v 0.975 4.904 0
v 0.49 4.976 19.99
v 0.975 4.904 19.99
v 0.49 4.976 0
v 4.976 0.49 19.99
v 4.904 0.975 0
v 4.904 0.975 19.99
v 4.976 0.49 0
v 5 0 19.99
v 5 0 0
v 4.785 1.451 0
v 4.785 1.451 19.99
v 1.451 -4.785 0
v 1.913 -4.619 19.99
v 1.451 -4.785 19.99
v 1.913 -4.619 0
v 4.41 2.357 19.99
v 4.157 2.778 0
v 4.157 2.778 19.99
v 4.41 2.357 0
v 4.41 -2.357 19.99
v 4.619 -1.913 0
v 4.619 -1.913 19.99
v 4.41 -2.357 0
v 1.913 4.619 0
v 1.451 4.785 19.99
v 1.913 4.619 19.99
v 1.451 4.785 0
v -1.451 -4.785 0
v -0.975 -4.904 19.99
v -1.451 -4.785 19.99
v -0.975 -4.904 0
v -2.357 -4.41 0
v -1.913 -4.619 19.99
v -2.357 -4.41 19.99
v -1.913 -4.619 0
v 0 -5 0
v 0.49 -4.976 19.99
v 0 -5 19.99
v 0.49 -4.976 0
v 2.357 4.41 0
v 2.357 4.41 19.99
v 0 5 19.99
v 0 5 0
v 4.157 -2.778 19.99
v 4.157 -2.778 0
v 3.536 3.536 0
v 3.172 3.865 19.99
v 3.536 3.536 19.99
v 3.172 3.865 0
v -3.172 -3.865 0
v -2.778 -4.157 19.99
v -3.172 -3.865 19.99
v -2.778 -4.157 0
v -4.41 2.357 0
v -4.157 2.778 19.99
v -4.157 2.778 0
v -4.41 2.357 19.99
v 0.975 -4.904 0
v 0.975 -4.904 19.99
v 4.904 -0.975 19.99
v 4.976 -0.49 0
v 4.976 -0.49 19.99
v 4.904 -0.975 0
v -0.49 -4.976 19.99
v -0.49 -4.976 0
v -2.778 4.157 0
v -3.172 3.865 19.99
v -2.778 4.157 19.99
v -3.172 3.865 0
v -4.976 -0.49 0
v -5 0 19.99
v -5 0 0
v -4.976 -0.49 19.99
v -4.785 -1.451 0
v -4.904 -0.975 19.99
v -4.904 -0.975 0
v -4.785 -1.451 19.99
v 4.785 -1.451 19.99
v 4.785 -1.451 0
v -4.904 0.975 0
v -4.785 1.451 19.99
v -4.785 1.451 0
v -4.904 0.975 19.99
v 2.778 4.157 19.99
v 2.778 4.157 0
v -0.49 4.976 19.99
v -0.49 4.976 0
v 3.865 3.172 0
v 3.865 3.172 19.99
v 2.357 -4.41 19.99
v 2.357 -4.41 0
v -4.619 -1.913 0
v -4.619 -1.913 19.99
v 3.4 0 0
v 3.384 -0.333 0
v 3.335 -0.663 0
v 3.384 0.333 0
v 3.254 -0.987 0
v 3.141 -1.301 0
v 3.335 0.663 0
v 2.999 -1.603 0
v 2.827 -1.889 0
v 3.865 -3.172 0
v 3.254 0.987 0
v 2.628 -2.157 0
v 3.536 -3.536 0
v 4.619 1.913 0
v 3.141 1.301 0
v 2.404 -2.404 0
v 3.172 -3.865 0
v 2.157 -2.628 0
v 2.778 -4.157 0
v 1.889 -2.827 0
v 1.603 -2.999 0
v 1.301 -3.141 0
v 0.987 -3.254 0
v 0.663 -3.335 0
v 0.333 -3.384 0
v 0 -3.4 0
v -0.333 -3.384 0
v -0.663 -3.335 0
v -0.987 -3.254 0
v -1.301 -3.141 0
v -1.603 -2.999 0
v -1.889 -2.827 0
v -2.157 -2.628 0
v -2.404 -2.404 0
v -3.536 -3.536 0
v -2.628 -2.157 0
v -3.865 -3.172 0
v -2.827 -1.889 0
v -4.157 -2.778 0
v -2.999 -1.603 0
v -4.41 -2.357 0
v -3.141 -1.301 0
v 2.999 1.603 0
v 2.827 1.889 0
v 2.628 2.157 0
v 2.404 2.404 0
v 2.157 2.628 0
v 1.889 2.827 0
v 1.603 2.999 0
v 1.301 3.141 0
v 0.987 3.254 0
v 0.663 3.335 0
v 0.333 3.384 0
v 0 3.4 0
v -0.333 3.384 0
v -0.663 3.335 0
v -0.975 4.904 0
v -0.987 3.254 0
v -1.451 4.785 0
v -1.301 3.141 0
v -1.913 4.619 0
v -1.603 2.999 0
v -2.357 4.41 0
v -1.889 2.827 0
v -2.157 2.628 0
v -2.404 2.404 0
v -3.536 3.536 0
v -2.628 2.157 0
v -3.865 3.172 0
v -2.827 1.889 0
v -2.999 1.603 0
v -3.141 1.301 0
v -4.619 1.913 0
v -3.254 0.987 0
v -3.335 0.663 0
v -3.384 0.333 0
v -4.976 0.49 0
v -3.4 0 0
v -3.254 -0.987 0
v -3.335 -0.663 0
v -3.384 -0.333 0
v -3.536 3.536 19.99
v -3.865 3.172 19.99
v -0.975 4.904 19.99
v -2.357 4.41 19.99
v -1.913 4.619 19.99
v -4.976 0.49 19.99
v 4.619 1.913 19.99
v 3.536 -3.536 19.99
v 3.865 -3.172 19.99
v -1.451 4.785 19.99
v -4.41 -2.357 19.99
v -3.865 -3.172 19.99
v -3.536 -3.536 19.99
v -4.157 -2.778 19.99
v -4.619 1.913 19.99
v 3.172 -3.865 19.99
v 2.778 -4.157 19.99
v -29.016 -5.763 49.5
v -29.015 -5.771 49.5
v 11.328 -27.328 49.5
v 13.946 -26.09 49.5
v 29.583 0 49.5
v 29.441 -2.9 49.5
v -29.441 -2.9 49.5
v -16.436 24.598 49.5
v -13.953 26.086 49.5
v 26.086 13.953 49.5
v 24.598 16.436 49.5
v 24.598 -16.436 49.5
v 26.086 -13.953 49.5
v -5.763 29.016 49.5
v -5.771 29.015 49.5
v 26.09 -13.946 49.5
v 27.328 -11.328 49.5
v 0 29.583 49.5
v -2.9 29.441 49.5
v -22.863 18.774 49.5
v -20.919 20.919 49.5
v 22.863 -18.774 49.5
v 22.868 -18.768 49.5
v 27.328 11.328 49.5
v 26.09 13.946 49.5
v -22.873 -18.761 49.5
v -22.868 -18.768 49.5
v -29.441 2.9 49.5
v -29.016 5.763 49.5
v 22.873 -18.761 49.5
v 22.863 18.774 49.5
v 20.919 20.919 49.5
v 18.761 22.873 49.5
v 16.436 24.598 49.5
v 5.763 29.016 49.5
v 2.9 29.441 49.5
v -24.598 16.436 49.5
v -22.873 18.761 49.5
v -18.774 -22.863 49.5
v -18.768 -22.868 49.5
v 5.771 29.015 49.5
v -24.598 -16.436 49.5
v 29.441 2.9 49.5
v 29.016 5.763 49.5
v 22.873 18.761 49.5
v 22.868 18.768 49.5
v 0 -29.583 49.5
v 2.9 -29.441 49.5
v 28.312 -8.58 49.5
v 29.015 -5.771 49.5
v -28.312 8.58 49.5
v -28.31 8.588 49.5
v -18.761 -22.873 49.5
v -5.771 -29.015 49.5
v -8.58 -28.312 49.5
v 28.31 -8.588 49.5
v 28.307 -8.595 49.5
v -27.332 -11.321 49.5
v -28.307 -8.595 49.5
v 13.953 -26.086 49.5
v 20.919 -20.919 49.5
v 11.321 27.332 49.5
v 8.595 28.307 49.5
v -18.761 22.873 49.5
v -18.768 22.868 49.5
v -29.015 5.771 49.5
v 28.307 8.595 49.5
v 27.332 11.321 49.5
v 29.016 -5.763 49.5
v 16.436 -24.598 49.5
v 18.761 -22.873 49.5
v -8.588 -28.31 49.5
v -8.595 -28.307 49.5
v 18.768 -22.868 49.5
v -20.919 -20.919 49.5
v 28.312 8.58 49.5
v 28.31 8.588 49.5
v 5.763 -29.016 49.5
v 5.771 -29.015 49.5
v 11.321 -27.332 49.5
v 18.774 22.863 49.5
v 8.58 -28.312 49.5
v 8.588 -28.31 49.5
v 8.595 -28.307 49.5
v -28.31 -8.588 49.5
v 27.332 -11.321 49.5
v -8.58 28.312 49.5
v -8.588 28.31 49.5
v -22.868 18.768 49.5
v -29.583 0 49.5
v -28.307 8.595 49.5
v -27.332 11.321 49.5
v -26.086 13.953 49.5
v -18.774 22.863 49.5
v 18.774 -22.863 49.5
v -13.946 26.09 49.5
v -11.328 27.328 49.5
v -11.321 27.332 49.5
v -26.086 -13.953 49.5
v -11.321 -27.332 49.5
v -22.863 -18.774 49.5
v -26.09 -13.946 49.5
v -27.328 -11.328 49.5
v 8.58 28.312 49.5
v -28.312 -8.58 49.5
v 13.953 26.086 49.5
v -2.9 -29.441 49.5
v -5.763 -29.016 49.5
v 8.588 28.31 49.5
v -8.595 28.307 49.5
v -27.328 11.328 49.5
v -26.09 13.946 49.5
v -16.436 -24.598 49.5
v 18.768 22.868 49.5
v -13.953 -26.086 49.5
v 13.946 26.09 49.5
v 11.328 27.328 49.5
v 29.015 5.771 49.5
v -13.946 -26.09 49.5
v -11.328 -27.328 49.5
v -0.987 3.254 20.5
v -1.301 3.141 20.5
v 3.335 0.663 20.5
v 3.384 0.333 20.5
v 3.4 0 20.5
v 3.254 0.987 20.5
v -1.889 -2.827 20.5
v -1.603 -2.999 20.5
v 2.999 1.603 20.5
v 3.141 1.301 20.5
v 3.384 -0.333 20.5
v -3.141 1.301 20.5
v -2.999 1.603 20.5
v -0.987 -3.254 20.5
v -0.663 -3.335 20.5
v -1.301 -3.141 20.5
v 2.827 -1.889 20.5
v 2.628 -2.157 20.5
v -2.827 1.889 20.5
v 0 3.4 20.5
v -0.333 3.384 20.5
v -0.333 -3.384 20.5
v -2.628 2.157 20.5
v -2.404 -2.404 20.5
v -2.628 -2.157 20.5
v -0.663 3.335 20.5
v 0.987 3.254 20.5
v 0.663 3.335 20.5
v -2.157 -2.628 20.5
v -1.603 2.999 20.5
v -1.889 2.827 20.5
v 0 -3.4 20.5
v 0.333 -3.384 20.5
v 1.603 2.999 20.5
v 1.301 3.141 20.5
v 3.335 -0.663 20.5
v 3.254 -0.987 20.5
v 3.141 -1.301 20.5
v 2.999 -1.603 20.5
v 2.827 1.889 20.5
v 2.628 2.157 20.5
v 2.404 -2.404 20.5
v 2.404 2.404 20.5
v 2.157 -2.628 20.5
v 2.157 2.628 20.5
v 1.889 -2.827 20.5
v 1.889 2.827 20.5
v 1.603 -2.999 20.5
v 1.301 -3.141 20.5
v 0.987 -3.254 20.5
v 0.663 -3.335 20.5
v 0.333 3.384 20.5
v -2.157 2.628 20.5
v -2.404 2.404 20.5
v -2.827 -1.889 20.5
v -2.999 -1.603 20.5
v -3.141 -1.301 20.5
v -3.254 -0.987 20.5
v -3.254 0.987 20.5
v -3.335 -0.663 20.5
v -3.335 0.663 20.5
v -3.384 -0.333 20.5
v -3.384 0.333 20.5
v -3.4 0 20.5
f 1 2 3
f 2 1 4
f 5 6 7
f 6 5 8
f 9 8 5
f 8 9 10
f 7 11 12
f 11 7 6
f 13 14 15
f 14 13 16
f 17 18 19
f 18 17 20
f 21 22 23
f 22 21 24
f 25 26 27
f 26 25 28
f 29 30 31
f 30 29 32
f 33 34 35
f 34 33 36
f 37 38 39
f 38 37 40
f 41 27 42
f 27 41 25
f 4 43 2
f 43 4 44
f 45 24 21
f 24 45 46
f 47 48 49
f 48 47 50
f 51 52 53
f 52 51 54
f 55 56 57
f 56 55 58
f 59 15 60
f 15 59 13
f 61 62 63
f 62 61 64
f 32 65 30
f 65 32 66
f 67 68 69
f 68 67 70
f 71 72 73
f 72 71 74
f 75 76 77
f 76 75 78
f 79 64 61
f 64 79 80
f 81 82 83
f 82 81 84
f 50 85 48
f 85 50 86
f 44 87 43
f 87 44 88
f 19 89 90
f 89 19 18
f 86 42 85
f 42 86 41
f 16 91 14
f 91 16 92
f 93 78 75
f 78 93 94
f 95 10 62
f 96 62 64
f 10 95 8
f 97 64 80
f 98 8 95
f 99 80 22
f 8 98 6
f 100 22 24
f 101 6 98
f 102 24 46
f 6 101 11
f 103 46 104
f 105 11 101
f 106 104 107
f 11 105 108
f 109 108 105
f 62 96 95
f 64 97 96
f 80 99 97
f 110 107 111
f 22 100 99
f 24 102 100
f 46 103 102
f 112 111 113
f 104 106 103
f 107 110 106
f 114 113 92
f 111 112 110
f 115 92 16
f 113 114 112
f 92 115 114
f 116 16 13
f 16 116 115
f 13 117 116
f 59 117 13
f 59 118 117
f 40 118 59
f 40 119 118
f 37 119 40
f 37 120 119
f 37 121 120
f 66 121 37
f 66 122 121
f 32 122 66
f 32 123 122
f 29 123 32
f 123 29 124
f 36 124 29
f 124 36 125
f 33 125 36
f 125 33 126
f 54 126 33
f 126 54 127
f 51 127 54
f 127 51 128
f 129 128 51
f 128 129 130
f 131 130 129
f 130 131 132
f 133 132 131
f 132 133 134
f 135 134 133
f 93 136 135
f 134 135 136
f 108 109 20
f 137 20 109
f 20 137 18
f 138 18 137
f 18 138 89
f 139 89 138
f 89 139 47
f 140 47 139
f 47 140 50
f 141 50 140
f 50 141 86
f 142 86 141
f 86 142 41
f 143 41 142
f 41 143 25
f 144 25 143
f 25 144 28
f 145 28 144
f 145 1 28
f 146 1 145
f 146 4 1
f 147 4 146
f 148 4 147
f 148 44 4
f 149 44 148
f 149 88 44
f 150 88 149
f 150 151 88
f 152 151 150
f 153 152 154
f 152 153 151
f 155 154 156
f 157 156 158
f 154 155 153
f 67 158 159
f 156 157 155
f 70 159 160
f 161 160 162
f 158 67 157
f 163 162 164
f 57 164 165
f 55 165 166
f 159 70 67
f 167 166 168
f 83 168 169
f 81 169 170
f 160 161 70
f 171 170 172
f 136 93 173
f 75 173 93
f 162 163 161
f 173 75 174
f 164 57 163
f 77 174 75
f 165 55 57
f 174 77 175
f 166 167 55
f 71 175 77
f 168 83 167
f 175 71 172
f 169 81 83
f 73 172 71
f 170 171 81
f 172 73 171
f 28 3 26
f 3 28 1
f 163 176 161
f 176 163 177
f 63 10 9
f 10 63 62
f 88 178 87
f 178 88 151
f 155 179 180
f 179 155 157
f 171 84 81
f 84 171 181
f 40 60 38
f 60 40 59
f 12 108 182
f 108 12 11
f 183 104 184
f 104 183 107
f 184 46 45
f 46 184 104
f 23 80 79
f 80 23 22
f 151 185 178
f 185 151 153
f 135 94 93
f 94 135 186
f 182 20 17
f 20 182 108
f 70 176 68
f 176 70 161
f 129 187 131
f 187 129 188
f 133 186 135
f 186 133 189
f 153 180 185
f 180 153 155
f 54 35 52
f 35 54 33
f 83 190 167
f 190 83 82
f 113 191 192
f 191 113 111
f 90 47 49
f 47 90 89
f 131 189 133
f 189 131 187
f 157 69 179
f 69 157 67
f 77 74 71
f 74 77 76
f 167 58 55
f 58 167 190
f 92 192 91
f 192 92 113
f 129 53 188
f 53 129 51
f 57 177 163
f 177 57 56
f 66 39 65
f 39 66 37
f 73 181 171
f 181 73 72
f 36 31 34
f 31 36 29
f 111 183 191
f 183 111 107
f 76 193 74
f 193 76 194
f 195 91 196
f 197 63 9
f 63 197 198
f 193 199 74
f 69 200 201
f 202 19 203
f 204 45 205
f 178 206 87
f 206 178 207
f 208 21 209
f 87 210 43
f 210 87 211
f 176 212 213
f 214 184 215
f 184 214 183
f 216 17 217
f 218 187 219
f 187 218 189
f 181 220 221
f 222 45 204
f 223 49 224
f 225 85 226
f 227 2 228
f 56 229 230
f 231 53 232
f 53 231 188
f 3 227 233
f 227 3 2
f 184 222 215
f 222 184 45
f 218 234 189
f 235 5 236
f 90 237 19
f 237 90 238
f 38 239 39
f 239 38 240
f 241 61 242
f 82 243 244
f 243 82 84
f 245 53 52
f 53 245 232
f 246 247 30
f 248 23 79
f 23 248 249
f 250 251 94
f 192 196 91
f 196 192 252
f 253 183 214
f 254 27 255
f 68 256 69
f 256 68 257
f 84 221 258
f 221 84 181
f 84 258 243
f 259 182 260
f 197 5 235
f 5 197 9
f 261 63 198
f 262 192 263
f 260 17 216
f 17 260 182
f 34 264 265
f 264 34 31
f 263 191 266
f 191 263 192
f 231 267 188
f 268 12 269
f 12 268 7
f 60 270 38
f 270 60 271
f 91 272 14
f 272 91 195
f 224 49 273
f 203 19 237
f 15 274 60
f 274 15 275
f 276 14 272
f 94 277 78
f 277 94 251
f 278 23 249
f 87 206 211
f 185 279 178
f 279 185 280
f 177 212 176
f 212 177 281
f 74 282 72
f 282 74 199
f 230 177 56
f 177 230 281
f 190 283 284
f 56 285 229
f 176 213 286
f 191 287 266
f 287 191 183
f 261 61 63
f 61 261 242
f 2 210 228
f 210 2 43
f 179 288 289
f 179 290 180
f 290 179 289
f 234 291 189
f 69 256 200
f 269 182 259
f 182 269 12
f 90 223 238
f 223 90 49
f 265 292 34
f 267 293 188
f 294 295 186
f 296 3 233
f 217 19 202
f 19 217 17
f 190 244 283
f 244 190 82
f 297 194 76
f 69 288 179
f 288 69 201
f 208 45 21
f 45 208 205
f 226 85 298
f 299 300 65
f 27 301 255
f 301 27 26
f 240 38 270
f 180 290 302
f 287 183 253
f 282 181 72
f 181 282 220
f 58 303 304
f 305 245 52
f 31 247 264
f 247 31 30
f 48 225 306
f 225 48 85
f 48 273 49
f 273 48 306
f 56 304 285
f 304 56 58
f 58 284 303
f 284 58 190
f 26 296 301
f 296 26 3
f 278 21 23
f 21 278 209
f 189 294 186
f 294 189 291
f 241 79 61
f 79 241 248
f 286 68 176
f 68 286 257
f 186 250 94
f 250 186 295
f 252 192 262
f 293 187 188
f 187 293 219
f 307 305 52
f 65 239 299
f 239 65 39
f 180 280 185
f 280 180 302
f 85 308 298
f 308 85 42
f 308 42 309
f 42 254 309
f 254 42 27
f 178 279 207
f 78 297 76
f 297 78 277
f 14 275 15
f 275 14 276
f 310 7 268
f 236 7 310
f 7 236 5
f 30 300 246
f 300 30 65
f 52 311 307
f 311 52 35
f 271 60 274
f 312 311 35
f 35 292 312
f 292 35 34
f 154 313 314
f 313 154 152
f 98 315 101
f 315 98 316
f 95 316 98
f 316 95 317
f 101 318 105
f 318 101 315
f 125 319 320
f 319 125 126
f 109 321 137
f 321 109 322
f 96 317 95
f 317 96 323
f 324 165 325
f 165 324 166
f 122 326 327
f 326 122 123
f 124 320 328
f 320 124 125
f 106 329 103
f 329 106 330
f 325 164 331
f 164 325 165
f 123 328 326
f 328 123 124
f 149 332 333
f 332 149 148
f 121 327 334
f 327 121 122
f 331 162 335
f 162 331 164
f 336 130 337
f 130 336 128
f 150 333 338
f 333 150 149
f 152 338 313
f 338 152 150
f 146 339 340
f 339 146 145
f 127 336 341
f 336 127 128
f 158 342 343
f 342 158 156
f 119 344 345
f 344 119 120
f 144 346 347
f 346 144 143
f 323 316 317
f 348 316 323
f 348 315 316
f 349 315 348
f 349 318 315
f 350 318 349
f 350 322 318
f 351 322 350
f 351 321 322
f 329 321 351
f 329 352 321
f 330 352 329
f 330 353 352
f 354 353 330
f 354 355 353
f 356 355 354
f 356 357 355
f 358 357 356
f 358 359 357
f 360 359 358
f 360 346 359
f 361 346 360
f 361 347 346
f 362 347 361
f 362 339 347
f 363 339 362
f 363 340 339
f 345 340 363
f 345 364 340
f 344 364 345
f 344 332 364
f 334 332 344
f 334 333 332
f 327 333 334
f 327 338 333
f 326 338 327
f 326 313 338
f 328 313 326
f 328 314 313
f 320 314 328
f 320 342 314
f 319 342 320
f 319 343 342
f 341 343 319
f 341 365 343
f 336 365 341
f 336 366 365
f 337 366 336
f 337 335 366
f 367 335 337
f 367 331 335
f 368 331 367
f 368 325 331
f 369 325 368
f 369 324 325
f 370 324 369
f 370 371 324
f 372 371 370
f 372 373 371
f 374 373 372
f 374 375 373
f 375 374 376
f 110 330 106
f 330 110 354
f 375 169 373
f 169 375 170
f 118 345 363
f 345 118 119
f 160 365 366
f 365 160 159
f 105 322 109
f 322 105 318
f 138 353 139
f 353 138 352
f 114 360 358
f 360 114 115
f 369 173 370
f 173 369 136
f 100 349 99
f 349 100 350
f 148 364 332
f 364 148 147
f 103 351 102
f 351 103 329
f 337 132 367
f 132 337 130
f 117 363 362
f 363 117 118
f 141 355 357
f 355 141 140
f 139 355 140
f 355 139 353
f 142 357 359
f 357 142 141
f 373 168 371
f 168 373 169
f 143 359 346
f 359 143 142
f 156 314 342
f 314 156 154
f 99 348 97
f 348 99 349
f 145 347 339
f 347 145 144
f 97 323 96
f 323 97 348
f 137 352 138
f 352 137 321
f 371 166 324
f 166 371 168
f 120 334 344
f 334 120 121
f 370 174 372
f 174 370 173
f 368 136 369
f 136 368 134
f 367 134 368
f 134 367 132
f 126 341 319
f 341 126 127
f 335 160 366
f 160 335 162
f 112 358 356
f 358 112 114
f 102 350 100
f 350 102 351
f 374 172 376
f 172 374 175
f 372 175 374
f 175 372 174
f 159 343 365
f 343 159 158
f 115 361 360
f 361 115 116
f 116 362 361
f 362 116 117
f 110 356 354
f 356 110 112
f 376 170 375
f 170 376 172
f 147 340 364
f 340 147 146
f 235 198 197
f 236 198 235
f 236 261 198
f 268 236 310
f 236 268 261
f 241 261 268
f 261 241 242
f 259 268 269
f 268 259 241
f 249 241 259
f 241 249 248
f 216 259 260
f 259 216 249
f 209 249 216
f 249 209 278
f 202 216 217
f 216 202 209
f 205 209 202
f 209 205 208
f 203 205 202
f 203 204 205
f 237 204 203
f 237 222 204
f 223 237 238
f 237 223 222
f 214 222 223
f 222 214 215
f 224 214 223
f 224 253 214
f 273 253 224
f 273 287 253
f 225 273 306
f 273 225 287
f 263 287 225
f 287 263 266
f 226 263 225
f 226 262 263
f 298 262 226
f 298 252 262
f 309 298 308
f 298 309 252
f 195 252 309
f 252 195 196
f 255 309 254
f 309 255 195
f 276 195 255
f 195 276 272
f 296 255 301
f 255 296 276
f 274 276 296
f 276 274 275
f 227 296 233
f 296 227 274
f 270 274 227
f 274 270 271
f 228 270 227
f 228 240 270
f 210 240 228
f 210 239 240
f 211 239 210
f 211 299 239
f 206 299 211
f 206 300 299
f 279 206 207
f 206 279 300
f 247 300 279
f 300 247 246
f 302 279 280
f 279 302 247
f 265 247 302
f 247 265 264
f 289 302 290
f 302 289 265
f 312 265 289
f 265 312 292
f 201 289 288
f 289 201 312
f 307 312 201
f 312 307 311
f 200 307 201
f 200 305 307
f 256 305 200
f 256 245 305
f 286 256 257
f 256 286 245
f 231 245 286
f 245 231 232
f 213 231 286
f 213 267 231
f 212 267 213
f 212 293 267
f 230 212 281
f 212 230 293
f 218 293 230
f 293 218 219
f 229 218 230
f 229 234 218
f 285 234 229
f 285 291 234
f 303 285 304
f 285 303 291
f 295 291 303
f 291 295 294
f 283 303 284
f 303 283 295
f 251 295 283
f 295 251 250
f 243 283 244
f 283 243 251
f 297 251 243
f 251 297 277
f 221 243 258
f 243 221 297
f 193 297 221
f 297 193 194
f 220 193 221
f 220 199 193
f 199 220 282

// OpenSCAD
// Lab funnel - printed upright, spout down
// Units: mm

$fn = 64;

// --- Spout (tube) ---
spout_od     = 10;    // outer diameter of spout
spout_length = 20;    // z = 0 to z = 20
spout_wall   = 1.6;   // wall thickness -> bore = 6.8 mm

// --- Cone ---
cone_bottom_d = 10;   // outer diameter at z = 20 (spout top)
cone_top_d    = 60;   // outer diameter at rim, z = 50
cone_top_z    = 50;   // rim height

// --- Cutting overlap ---
eps = 0.5;            // extension past cut faces

difference() {
    union() {
        // Spout
        cylinder(d = spout_od, h = spout_length);

        // Cone (slightly overlapping the spout for a clean union)
        translate([0, 0, spout_length - 0.01])
            cylinder(d1 = cone_bottom_d,
                     d2 = cone_top_d,
                     h  = cone_top_z - spout_length + 0.01);
    }

    // Hollow out the spout bore (through the full length)
    translate([0, 0, -eps])
        cylinder(d = spout_od - 2 * spout_wall, h = spout_length + 2 * eps);

    // Open the top: cylinder of the rim diameter from the top down
    translate([0, 0, cone_top_z - eps])
        cylinder(d = cone_top_d, h = eps);
}
